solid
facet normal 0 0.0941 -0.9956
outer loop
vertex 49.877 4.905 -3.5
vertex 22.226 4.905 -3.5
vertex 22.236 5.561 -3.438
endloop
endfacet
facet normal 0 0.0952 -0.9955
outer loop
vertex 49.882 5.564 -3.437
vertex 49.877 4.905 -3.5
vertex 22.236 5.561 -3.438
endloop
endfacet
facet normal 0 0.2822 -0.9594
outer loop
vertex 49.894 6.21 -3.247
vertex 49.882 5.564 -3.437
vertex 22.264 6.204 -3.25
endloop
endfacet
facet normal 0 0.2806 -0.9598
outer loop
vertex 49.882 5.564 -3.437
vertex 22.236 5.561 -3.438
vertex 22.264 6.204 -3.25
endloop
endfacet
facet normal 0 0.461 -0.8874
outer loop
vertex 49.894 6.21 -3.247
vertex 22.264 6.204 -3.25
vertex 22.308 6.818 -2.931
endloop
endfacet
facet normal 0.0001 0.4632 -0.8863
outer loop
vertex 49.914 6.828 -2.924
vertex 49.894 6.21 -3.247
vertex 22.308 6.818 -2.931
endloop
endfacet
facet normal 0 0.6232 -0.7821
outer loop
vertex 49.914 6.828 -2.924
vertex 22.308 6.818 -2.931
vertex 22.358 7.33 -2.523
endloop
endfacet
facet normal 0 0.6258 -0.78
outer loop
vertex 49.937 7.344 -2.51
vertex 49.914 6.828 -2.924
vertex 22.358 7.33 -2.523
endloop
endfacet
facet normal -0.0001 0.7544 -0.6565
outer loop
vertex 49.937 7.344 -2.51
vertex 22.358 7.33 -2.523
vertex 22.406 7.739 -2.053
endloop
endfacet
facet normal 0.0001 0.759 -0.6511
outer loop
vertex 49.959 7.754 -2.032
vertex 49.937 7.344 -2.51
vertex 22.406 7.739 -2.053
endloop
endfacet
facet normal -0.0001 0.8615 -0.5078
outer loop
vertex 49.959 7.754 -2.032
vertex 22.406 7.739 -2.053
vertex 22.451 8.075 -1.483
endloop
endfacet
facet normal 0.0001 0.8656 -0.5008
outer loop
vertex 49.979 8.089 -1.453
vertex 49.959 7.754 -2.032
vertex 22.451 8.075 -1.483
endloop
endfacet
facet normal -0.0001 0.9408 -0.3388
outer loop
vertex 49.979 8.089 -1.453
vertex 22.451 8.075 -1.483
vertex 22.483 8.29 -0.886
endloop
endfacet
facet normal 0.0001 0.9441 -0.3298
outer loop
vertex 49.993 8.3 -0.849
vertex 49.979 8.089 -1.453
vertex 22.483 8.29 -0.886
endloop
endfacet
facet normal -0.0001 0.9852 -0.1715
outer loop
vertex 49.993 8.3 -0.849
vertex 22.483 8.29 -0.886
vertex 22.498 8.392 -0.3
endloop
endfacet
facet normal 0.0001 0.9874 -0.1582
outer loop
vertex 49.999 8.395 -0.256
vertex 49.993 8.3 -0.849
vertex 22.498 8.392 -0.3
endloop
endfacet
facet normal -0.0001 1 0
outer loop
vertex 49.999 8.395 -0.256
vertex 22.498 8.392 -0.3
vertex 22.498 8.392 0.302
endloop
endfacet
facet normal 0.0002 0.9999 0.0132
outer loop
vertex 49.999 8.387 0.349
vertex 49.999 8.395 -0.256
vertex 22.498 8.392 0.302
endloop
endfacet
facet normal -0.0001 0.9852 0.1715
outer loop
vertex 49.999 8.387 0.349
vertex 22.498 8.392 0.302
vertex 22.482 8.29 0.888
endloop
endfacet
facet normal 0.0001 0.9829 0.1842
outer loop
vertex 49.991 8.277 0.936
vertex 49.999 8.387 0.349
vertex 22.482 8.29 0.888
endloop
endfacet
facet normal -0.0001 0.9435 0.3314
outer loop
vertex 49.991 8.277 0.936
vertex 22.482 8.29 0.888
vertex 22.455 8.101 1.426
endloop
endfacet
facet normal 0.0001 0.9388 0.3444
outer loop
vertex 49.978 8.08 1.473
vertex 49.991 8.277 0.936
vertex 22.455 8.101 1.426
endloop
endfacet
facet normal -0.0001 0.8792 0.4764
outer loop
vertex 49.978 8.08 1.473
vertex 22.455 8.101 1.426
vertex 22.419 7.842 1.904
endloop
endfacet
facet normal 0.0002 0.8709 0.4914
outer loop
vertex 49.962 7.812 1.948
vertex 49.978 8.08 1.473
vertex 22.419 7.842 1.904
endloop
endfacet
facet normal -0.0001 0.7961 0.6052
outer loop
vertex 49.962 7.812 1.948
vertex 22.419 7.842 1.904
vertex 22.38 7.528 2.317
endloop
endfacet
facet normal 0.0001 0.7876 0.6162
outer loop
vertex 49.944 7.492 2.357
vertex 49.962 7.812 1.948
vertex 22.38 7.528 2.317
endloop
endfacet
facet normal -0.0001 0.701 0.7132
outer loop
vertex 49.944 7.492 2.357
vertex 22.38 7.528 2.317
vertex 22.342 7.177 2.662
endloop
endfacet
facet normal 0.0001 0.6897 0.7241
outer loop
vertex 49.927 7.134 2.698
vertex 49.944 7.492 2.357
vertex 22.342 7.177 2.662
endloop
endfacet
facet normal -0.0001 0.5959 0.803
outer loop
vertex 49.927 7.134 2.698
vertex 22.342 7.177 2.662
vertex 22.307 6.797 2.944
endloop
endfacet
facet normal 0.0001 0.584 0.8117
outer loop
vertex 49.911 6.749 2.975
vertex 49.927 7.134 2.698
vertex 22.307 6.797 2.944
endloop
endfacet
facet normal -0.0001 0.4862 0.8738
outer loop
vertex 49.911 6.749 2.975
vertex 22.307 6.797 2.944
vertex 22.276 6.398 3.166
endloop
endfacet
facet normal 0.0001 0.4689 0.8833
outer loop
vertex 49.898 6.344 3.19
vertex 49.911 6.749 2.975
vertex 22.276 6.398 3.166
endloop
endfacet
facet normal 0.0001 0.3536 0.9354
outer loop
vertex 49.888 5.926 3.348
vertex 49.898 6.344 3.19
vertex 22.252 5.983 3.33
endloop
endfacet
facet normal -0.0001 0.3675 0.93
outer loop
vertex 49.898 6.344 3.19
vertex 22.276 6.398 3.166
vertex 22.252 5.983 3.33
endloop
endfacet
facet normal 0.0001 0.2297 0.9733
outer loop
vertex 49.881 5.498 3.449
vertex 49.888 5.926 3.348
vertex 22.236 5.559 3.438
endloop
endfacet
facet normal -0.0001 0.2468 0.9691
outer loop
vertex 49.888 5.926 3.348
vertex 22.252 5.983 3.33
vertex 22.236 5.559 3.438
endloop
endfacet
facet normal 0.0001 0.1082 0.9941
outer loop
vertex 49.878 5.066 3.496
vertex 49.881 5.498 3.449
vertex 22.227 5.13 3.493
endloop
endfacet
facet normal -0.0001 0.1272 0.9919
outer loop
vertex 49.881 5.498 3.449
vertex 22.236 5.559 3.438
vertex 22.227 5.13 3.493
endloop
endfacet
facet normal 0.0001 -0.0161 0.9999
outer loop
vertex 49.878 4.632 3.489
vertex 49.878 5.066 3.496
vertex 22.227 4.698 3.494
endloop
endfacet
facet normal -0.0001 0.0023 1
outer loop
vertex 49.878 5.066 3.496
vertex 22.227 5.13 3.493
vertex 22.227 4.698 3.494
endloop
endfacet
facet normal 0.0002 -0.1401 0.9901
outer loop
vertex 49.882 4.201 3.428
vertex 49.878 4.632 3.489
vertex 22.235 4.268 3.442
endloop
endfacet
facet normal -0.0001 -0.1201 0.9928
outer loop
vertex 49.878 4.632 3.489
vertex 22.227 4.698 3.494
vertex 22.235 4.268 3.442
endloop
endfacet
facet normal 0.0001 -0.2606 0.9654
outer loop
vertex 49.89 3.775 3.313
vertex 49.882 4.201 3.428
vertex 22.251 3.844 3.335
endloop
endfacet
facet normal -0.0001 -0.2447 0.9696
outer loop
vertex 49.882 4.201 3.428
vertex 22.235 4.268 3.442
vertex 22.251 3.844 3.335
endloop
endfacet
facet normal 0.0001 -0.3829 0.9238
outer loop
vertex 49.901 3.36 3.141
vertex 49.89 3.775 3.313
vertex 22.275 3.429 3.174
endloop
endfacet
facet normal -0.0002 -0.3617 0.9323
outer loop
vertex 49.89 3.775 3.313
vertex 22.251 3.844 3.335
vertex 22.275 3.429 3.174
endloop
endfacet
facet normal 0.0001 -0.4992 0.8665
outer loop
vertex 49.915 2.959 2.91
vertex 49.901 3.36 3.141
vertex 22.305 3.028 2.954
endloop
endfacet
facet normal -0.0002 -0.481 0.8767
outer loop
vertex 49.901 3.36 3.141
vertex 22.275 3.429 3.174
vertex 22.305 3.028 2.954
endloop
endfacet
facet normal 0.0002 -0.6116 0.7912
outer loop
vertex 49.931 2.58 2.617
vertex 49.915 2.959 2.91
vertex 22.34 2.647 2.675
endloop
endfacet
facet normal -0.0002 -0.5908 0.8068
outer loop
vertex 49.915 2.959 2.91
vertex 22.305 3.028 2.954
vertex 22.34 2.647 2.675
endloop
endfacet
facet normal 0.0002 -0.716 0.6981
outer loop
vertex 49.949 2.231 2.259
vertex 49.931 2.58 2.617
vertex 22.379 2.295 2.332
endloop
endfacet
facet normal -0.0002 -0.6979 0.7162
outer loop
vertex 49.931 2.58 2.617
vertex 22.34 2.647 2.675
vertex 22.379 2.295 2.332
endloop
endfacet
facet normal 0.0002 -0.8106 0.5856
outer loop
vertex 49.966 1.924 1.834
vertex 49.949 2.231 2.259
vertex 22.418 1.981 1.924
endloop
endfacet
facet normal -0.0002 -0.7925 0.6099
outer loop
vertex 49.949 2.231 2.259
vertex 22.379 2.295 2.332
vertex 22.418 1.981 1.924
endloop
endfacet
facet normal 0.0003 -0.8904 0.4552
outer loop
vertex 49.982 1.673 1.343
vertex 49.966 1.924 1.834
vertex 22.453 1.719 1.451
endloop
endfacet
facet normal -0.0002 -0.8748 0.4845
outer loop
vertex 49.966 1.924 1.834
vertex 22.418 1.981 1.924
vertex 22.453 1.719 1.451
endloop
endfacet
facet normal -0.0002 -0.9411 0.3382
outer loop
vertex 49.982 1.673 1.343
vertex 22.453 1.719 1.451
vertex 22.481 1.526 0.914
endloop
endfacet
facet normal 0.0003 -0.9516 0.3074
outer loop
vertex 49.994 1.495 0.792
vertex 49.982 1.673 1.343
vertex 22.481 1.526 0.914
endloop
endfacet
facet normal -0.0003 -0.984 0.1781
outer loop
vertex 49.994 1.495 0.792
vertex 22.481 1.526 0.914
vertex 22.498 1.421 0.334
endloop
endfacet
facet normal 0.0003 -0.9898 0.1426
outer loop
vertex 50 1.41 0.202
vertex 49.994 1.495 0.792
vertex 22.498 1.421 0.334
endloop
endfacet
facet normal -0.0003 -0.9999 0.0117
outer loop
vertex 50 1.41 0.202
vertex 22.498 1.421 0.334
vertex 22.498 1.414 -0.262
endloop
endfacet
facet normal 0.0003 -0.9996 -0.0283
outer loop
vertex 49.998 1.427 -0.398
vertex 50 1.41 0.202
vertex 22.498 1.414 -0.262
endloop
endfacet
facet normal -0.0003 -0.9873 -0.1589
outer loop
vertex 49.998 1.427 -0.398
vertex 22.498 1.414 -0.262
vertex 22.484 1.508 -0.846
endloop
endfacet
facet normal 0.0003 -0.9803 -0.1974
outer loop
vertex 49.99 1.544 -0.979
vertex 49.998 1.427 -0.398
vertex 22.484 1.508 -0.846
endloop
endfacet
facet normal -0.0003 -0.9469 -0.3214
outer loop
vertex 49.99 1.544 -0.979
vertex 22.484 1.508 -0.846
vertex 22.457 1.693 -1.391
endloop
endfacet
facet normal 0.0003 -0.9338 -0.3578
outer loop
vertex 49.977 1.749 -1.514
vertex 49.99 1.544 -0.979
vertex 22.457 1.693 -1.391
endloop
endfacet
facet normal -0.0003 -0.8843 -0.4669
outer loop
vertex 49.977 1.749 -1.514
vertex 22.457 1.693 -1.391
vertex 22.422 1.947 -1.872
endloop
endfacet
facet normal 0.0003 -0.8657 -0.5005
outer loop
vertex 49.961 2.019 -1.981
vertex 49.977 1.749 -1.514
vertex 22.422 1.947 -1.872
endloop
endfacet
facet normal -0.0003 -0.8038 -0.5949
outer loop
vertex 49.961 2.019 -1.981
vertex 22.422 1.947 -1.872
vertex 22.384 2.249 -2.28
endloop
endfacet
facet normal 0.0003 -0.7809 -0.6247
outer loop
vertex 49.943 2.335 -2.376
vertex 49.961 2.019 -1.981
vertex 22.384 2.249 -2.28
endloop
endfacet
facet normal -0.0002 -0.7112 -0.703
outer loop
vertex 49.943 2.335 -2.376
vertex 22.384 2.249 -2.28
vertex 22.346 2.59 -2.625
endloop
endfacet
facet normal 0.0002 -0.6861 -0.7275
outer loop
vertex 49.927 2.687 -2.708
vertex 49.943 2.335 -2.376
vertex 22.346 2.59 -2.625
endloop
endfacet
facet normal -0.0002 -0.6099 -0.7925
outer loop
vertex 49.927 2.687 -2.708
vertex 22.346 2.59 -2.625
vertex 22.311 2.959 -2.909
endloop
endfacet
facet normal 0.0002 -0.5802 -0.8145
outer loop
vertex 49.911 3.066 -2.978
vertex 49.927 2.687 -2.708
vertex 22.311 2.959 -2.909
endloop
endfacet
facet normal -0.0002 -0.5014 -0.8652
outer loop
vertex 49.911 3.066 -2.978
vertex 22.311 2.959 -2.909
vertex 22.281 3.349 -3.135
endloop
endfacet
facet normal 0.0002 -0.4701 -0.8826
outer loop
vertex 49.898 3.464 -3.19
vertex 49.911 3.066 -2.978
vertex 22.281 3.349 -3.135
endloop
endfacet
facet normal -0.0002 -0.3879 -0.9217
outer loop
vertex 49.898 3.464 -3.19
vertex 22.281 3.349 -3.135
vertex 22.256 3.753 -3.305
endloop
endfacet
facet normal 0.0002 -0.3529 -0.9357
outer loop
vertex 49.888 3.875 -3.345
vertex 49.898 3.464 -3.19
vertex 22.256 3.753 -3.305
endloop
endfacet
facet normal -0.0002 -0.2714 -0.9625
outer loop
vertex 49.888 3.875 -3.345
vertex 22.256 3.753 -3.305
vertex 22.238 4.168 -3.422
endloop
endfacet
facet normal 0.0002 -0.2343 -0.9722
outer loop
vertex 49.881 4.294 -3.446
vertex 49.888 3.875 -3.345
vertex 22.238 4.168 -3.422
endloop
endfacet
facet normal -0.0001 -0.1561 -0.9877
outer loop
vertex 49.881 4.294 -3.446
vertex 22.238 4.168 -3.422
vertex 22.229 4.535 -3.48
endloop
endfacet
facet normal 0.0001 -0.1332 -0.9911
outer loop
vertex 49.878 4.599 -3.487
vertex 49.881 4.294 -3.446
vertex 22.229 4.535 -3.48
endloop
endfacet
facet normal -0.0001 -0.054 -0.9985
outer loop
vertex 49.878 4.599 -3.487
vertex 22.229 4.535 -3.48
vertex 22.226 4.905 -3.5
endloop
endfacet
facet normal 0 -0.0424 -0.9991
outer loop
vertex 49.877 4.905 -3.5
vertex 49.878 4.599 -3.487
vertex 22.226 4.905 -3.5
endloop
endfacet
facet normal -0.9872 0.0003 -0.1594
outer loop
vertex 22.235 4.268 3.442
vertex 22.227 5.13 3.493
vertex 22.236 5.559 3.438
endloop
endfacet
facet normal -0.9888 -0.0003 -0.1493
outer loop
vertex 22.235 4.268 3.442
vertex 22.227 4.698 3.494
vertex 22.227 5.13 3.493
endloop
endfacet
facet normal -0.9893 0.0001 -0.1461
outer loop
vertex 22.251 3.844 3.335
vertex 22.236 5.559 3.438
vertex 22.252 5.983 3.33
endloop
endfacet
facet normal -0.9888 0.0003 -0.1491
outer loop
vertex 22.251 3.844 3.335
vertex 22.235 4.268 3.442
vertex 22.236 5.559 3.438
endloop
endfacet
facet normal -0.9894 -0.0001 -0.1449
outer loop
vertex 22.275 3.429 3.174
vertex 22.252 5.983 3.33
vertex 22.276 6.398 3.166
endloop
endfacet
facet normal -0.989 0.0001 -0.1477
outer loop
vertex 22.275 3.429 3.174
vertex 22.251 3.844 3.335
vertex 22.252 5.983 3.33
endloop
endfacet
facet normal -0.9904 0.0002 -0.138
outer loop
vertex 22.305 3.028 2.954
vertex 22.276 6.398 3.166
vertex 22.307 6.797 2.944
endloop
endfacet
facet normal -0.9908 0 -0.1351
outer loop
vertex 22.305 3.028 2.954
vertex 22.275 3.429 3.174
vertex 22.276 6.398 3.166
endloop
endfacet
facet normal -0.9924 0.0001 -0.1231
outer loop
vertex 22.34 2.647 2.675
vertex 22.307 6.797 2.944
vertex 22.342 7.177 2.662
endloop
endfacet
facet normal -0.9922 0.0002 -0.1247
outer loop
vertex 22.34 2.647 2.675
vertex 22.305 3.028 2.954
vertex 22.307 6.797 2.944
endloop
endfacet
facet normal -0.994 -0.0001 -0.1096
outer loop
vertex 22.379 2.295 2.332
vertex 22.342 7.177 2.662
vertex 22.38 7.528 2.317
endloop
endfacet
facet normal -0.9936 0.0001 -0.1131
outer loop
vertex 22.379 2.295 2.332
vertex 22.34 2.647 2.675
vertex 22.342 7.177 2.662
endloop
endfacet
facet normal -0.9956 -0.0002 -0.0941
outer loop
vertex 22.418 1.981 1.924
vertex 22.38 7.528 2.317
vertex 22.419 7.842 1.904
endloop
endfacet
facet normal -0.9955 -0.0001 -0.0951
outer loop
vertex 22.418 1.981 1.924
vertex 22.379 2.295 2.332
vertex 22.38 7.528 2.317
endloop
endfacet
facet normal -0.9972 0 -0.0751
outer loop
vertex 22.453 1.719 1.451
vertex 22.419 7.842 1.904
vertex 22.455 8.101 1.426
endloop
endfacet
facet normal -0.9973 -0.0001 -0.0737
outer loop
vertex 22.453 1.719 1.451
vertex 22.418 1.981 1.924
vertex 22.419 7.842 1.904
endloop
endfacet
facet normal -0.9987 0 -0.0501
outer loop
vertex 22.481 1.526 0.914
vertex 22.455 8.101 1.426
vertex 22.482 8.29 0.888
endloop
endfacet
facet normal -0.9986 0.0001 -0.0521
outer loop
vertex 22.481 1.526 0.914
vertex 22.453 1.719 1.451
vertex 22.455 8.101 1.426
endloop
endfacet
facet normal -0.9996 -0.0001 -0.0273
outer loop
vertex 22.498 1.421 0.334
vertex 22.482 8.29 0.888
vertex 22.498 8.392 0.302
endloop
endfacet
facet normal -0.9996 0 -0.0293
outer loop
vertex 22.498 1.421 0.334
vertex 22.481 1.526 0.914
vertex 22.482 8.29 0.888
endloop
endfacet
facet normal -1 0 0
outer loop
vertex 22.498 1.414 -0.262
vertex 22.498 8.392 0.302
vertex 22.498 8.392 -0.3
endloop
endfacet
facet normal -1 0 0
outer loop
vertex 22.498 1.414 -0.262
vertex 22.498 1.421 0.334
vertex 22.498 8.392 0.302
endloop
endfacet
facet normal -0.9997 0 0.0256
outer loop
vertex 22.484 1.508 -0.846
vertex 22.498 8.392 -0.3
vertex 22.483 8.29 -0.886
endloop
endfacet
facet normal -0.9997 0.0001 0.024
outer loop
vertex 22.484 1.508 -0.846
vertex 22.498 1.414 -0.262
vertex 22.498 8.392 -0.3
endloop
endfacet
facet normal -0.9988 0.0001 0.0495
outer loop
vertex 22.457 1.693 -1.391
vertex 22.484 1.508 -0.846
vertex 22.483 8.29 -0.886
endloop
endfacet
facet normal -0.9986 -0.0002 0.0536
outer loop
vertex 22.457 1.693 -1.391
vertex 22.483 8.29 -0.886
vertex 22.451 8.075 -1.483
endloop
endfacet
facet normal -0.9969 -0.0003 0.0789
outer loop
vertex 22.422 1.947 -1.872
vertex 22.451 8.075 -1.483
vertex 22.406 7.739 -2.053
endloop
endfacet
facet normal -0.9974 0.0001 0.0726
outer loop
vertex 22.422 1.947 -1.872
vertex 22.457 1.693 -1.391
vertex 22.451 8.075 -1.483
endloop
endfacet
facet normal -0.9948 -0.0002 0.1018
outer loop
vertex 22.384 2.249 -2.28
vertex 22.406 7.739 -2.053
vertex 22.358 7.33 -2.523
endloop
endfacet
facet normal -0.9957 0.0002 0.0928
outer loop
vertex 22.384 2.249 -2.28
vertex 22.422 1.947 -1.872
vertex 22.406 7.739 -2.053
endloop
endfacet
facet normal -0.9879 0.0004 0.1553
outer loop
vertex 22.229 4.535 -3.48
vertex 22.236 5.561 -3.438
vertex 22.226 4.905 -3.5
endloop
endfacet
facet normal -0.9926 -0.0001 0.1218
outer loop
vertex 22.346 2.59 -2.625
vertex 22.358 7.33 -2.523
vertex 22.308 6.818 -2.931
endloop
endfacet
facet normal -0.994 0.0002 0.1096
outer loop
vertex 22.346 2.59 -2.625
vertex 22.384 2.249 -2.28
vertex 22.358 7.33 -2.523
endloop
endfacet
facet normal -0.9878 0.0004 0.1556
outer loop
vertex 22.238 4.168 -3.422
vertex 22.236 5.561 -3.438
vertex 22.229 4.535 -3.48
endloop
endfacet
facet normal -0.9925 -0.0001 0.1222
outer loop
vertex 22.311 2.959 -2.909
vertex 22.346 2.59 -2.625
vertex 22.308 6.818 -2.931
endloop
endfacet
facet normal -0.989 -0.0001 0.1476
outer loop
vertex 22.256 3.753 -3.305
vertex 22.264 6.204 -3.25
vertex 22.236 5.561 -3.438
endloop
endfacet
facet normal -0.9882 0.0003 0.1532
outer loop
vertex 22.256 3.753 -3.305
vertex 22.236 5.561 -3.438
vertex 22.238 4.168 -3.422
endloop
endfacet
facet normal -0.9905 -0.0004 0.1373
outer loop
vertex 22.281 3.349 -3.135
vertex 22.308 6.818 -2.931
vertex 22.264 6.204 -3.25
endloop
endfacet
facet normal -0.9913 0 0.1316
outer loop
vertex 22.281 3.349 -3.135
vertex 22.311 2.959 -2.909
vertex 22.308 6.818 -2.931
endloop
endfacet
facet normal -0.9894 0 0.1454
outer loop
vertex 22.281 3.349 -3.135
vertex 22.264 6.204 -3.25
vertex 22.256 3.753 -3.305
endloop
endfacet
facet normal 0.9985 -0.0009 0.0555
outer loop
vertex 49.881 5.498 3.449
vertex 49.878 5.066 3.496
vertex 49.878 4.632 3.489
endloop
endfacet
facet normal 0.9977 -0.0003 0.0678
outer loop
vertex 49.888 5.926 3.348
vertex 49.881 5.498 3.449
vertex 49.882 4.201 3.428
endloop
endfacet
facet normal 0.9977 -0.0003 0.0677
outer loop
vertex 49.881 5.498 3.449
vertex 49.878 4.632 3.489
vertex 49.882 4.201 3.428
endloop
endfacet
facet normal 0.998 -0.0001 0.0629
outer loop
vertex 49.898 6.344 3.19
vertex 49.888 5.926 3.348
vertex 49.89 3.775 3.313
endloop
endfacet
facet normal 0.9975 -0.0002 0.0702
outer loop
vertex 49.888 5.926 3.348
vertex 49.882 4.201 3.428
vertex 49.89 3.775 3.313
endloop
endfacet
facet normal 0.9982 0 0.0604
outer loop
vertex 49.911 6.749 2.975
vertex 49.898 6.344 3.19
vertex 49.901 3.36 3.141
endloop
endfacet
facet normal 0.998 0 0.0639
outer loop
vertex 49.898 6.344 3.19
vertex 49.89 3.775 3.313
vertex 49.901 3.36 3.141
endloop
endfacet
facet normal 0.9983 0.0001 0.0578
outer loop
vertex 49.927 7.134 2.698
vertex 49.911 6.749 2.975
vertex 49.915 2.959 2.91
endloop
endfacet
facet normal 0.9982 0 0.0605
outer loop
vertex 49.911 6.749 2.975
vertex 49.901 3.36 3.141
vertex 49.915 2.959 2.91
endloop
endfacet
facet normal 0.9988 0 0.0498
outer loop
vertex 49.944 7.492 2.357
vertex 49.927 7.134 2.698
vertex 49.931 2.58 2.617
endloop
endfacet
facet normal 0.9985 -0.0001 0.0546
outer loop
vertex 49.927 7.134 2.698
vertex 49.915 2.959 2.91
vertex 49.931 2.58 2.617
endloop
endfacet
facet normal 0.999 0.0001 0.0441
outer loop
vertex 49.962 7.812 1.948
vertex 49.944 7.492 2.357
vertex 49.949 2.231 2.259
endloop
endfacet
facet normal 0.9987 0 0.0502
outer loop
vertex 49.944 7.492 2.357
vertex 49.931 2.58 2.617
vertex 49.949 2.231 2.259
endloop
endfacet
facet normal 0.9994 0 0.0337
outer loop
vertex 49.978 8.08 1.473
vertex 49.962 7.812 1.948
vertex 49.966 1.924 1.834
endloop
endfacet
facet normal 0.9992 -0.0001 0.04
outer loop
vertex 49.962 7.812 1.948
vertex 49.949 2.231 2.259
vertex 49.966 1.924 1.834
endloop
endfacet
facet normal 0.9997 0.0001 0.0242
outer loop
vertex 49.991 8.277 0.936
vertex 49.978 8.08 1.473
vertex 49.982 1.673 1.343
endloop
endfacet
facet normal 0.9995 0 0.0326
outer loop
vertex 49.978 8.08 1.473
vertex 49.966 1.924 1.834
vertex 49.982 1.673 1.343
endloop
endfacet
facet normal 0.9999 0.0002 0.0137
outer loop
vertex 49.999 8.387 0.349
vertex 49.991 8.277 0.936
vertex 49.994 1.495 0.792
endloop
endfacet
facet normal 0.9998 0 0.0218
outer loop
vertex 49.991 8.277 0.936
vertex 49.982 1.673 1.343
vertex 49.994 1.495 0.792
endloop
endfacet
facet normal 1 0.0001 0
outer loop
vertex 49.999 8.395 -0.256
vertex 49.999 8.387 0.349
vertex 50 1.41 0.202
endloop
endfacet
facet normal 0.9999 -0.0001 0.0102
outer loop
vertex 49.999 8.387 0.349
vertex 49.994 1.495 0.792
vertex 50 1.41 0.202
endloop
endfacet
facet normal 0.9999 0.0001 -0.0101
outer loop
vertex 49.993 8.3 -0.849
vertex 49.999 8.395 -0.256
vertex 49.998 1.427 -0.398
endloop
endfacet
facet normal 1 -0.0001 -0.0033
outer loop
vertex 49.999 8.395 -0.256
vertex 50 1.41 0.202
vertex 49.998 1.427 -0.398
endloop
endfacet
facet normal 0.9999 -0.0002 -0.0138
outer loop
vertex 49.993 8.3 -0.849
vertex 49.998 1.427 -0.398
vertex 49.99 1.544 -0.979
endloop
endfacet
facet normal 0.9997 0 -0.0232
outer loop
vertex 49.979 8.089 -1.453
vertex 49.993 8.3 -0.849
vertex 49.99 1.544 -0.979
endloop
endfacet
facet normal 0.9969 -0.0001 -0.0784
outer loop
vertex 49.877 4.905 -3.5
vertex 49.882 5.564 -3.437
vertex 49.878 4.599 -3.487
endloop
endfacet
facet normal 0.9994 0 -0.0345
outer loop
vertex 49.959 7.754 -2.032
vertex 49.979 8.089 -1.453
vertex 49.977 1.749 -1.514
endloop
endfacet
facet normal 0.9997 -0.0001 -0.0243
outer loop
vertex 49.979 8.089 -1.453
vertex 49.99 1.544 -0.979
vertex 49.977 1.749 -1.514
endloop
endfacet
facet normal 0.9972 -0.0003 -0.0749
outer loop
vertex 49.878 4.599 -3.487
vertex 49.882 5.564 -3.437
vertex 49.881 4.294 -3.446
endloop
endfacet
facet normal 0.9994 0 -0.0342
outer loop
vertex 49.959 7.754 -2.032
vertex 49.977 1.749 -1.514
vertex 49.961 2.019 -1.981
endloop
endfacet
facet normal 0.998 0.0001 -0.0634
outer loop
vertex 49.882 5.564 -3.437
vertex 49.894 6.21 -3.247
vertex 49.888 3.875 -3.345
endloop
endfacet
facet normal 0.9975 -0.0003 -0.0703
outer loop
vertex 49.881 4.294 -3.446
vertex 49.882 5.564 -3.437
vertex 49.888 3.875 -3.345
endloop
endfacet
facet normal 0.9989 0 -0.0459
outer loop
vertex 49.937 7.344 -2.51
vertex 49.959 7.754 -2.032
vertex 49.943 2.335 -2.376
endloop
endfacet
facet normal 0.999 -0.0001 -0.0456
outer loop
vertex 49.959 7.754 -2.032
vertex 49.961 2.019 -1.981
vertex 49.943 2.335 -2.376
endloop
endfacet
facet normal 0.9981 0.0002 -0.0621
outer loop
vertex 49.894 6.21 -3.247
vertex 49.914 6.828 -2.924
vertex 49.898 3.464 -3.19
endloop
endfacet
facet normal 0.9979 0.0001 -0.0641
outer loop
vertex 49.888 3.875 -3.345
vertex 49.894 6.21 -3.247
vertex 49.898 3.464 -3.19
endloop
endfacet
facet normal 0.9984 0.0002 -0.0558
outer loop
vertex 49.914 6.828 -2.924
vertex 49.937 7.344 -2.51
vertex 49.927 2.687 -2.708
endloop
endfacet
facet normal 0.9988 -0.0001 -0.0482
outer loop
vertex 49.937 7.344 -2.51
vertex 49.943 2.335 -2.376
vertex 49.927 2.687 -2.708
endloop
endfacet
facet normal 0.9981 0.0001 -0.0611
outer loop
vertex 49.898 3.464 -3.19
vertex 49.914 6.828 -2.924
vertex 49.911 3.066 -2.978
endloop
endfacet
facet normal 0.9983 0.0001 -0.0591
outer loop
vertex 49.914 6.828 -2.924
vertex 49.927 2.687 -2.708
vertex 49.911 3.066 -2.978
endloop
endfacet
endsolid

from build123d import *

# Parameters (mm, degrees)
SKETCH1_R           = 50
SKETCH1_R_2         = 22.5
BOSS_EXTRUDE6_DEPTH = 10
SKETCH2_R           = 3.5
BOSS_EXTRUDE7_DEPTH = 100


with BuildPart() as part:
    # Sketch1 → Boss-Extrude6 (new body)
    with BuildSketch(Plane(origin=(0, 0, 0), x_dir=(1, 0, 0), z_dir=(0, 1, 0))):
        Circle(SKETCH1_R)
        Circle(SKETCH1_R_2, mode=Mode.SUBTRACT)
    extrude(amount=BOSS_EXTRUDE6_DEPTH)


with BuildPart() as body_2:
    # Sketch2 → Boss-Extrude7 (new body)
    with BuildSketch(Plane(origin=(10, 0, 0), x_dir=(0, 0, -1), z_dir=(1, 0, 0))):
        with Locations((0, 4.904618841)):
            Circle(SKETCH2_R)
    extrude(amount=BOSS_EXTRUDE7_DEPTH)


with BuildPart() as part_1:
    add(part.part)

    # Combine1: intersect body 2
    add(body_2.part, mode=Mode.INTERSECT)


solid = part_1.part
